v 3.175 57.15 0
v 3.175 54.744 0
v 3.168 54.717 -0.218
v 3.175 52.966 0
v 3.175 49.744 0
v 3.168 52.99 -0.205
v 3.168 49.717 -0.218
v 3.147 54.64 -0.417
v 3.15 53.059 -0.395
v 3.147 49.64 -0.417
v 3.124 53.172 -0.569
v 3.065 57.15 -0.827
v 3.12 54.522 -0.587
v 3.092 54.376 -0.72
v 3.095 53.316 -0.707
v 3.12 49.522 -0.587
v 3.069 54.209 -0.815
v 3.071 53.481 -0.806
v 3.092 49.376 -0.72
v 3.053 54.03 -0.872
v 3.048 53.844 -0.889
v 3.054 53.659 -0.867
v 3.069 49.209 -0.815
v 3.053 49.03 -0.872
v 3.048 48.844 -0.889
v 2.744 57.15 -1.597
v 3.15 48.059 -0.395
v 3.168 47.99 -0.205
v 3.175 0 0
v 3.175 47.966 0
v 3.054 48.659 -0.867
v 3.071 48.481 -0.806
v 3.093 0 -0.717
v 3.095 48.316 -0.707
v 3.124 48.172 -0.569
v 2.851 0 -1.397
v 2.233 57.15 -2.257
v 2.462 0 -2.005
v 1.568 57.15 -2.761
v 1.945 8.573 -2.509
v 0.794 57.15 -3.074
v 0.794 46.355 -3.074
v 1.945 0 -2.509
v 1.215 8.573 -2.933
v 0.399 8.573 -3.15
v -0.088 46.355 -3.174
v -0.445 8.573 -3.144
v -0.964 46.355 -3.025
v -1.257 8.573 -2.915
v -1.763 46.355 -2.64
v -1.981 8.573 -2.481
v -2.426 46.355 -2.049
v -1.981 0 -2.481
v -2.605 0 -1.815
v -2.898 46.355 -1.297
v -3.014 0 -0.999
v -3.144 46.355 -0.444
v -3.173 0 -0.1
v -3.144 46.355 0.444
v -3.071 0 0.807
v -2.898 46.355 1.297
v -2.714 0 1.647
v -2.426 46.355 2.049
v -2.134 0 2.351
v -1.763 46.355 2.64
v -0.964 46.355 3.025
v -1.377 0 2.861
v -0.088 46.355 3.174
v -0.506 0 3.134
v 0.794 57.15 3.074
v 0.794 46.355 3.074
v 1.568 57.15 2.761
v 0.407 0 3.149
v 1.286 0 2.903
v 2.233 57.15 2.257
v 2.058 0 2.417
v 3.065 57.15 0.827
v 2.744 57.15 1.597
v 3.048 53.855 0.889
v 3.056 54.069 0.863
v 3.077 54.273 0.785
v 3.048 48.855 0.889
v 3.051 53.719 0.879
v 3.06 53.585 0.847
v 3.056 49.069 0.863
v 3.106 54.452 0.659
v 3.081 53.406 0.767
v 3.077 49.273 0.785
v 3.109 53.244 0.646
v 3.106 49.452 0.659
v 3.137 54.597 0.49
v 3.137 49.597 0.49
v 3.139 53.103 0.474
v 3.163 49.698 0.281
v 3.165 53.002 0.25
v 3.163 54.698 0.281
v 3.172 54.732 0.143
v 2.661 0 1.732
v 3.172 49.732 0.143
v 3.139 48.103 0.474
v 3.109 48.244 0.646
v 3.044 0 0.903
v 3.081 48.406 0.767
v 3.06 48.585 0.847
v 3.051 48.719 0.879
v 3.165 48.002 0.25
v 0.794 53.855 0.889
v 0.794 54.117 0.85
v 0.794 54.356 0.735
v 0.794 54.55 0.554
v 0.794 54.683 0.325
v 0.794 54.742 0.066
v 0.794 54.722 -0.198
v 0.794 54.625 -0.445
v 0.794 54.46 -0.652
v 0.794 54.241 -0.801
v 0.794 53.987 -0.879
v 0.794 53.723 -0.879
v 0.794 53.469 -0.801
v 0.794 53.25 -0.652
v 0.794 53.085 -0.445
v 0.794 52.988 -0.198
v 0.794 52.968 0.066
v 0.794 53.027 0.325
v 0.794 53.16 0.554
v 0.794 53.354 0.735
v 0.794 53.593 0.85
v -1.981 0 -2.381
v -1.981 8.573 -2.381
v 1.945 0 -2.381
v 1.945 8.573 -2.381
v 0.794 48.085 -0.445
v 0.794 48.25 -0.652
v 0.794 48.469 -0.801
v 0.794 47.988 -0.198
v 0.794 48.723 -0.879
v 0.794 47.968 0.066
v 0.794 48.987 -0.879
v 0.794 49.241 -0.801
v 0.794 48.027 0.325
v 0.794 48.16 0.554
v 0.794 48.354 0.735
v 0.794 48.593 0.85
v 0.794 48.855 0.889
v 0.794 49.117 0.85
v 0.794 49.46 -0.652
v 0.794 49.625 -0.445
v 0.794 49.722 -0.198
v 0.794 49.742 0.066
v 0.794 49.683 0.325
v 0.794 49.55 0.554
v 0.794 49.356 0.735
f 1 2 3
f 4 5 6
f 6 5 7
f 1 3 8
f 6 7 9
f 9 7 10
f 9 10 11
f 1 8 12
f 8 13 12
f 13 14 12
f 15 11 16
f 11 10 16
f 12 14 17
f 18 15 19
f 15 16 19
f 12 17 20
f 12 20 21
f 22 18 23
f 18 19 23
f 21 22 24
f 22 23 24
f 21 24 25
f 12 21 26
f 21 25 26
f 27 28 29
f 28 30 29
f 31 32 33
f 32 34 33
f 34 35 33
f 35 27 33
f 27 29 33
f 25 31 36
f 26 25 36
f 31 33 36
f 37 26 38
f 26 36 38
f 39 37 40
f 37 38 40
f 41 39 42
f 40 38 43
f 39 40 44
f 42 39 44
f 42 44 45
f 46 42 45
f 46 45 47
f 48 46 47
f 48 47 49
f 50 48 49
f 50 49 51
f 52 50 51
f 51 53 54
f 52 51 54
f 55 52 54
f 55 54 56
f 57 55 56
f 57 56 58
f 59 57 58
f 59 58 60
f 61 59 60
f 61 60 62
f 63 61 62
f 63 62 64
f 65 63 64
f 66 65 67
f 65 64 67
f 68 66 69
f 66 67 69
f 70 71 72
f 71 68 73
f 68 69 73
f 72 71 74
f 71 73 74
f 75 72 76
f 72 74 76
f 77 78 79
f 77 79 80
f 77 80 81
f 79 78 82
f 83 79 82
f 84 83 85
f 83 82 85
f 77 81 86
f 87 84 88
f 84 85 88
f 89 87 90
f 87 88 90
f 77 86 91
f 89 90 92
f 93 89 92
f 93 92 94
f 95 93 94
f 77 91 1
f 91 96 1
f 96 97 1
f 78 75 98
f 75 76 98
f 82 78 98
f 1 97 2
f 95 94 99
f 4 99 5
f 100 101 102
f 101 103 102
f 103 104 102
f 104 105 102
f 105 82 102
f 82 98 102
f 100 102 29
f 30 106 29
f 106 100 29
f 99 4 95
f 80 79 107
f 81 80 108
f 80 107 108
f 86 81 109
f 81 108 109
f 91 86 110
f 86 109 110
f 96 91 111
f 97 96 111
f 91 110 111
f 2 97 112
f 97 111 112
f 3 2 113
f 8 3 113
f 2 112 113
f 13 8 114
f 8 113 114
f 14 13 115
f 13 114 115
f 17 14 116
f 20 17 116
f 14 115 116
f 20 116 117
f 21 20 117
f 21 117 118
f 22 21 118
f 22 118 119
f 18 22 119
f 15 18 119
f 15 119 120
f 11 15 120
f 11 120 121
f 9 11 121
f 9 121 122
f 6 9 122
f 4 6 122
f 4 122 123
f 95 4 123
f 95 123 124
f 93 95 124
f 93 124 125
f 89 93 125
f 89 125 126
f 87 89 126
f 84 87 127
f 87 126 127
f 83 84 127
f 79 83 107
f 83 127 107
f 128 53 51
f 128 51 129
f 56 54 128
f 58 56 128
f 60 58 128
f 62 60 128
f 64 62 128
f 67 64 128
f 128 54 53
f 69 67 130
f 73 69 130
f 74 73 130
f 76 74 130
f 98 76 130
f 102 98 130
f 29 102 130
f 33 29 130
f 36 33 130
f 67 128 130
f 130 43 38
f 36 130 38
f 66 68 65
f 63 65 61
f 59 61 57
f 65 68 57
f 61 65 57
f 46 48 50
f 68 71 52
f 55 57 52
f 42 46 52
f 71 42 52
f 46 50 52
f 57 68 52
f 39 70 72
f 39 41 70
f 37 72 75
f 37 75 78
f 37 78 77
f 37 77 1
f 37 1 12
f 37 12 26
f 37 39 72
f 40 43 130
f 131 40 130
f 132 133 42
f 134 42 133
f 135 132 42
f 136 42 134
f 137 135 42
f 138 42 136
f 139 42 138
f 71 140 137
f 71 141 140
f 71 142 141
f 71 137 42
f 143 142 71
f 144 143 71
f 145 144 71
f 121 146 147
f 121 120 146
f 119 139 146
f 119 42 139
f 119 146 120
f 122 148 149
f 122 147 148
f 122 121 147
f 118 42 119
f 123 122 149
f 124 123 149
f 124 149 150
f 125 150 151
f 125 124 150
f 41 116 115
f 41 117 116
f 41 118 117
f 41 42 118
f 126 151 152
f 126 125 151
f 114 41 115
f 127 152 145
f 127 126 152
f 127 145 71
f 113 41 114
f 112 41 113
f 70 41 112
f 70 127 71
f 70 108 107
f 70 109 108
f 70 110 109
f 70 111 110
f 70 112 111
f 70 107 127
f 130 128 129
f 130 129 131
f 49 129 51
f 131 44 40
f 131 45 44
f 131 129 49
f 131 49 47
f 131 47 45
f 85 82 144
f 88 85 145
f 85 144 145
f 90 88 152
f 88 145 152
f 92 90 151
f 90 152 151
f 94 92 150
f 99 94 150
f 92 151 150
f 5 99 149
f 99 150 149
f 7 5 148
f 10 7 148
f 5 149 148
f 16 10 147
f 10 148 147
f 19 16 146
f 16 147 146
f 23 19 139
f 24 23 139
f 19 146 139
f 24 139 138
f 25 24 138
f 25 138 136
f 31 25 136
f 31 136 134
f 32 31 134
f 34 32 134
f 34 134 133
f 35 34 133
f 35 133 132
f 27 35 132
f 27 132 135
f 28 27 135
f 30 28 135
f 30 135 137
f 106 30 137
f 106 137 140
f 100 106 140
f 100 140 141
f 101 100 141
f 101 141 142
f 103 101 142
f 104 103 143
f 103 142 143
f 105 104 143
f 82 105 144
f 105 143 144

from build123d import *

# Parameters (mm, degrees)
SKETCH_1_R          = 3.175
EXTRUDE_1_DEPTH     = 57.15
CUT_EXTRUDE_1_DEPTH = 10.795
SKETCH_3_R          = 0.889
CUT_EXTRUDE_2_DEPTH = 10.795
SKETCH_4_W          = 3.926157487
SKETCH_4_H          = 0.79375
CUT_EXTRUDE_3_DEPTH = 8.573


with BuildPart() as part:
    # 草图1 → 凸台-拉伸1 (new body)
    with BuildSketch(Plane(origin=(0, 0, 0), x_dir=(1, 0, 0), z_dir=(0, 1, 0))):
        Circle(SKETCH_1_R)
    extrude(amount=EXTRUDE_1_DEPTH)

    # 草图2 → 切除-拉伸1 (cut)
    with BuildSketch(Plane(origin=(0, 57.15, 0), x_dir=(1, 0, 0), z_dir=(0, 1, 0))):
        Polygon((-0.794, 3.175), (0.794, 3.175), (0.794, -3.175), (-3.175, -3.175), (-3.175, 3.175), align=None)
    extrude(amount=-CUT_EXTRUDE_1_DEPTH, mode=Mode.SUBTRACT)

    # 草图3 → 切除-拉伸2 (cut)
    with BuildSketch(Plane.ZY.offset(-0.794)):
        with Locations((0, 53.855)):
            Circle(SKETCH_3_R)
        with Locations((0, 48.855)):
            Circle(SKETCH_3_R)
    extrude(amount=-CUT_EXTRUDE_2_DEPTH, mode=Mode.SUBTRACT)

    # 草图4 → 切除-拉伸3 (cut)
    with BuildSketch(Plane.XZ):
        with Locations((-0.018009896, -2.778125)):
            Rectangle(SKETCH_4_W, SKETCH_4_H)
    extrude(amount=-CUT_EXTRUDE_3_DEPTH, mode=Mode.SUBTRACT)


solid = part.part
